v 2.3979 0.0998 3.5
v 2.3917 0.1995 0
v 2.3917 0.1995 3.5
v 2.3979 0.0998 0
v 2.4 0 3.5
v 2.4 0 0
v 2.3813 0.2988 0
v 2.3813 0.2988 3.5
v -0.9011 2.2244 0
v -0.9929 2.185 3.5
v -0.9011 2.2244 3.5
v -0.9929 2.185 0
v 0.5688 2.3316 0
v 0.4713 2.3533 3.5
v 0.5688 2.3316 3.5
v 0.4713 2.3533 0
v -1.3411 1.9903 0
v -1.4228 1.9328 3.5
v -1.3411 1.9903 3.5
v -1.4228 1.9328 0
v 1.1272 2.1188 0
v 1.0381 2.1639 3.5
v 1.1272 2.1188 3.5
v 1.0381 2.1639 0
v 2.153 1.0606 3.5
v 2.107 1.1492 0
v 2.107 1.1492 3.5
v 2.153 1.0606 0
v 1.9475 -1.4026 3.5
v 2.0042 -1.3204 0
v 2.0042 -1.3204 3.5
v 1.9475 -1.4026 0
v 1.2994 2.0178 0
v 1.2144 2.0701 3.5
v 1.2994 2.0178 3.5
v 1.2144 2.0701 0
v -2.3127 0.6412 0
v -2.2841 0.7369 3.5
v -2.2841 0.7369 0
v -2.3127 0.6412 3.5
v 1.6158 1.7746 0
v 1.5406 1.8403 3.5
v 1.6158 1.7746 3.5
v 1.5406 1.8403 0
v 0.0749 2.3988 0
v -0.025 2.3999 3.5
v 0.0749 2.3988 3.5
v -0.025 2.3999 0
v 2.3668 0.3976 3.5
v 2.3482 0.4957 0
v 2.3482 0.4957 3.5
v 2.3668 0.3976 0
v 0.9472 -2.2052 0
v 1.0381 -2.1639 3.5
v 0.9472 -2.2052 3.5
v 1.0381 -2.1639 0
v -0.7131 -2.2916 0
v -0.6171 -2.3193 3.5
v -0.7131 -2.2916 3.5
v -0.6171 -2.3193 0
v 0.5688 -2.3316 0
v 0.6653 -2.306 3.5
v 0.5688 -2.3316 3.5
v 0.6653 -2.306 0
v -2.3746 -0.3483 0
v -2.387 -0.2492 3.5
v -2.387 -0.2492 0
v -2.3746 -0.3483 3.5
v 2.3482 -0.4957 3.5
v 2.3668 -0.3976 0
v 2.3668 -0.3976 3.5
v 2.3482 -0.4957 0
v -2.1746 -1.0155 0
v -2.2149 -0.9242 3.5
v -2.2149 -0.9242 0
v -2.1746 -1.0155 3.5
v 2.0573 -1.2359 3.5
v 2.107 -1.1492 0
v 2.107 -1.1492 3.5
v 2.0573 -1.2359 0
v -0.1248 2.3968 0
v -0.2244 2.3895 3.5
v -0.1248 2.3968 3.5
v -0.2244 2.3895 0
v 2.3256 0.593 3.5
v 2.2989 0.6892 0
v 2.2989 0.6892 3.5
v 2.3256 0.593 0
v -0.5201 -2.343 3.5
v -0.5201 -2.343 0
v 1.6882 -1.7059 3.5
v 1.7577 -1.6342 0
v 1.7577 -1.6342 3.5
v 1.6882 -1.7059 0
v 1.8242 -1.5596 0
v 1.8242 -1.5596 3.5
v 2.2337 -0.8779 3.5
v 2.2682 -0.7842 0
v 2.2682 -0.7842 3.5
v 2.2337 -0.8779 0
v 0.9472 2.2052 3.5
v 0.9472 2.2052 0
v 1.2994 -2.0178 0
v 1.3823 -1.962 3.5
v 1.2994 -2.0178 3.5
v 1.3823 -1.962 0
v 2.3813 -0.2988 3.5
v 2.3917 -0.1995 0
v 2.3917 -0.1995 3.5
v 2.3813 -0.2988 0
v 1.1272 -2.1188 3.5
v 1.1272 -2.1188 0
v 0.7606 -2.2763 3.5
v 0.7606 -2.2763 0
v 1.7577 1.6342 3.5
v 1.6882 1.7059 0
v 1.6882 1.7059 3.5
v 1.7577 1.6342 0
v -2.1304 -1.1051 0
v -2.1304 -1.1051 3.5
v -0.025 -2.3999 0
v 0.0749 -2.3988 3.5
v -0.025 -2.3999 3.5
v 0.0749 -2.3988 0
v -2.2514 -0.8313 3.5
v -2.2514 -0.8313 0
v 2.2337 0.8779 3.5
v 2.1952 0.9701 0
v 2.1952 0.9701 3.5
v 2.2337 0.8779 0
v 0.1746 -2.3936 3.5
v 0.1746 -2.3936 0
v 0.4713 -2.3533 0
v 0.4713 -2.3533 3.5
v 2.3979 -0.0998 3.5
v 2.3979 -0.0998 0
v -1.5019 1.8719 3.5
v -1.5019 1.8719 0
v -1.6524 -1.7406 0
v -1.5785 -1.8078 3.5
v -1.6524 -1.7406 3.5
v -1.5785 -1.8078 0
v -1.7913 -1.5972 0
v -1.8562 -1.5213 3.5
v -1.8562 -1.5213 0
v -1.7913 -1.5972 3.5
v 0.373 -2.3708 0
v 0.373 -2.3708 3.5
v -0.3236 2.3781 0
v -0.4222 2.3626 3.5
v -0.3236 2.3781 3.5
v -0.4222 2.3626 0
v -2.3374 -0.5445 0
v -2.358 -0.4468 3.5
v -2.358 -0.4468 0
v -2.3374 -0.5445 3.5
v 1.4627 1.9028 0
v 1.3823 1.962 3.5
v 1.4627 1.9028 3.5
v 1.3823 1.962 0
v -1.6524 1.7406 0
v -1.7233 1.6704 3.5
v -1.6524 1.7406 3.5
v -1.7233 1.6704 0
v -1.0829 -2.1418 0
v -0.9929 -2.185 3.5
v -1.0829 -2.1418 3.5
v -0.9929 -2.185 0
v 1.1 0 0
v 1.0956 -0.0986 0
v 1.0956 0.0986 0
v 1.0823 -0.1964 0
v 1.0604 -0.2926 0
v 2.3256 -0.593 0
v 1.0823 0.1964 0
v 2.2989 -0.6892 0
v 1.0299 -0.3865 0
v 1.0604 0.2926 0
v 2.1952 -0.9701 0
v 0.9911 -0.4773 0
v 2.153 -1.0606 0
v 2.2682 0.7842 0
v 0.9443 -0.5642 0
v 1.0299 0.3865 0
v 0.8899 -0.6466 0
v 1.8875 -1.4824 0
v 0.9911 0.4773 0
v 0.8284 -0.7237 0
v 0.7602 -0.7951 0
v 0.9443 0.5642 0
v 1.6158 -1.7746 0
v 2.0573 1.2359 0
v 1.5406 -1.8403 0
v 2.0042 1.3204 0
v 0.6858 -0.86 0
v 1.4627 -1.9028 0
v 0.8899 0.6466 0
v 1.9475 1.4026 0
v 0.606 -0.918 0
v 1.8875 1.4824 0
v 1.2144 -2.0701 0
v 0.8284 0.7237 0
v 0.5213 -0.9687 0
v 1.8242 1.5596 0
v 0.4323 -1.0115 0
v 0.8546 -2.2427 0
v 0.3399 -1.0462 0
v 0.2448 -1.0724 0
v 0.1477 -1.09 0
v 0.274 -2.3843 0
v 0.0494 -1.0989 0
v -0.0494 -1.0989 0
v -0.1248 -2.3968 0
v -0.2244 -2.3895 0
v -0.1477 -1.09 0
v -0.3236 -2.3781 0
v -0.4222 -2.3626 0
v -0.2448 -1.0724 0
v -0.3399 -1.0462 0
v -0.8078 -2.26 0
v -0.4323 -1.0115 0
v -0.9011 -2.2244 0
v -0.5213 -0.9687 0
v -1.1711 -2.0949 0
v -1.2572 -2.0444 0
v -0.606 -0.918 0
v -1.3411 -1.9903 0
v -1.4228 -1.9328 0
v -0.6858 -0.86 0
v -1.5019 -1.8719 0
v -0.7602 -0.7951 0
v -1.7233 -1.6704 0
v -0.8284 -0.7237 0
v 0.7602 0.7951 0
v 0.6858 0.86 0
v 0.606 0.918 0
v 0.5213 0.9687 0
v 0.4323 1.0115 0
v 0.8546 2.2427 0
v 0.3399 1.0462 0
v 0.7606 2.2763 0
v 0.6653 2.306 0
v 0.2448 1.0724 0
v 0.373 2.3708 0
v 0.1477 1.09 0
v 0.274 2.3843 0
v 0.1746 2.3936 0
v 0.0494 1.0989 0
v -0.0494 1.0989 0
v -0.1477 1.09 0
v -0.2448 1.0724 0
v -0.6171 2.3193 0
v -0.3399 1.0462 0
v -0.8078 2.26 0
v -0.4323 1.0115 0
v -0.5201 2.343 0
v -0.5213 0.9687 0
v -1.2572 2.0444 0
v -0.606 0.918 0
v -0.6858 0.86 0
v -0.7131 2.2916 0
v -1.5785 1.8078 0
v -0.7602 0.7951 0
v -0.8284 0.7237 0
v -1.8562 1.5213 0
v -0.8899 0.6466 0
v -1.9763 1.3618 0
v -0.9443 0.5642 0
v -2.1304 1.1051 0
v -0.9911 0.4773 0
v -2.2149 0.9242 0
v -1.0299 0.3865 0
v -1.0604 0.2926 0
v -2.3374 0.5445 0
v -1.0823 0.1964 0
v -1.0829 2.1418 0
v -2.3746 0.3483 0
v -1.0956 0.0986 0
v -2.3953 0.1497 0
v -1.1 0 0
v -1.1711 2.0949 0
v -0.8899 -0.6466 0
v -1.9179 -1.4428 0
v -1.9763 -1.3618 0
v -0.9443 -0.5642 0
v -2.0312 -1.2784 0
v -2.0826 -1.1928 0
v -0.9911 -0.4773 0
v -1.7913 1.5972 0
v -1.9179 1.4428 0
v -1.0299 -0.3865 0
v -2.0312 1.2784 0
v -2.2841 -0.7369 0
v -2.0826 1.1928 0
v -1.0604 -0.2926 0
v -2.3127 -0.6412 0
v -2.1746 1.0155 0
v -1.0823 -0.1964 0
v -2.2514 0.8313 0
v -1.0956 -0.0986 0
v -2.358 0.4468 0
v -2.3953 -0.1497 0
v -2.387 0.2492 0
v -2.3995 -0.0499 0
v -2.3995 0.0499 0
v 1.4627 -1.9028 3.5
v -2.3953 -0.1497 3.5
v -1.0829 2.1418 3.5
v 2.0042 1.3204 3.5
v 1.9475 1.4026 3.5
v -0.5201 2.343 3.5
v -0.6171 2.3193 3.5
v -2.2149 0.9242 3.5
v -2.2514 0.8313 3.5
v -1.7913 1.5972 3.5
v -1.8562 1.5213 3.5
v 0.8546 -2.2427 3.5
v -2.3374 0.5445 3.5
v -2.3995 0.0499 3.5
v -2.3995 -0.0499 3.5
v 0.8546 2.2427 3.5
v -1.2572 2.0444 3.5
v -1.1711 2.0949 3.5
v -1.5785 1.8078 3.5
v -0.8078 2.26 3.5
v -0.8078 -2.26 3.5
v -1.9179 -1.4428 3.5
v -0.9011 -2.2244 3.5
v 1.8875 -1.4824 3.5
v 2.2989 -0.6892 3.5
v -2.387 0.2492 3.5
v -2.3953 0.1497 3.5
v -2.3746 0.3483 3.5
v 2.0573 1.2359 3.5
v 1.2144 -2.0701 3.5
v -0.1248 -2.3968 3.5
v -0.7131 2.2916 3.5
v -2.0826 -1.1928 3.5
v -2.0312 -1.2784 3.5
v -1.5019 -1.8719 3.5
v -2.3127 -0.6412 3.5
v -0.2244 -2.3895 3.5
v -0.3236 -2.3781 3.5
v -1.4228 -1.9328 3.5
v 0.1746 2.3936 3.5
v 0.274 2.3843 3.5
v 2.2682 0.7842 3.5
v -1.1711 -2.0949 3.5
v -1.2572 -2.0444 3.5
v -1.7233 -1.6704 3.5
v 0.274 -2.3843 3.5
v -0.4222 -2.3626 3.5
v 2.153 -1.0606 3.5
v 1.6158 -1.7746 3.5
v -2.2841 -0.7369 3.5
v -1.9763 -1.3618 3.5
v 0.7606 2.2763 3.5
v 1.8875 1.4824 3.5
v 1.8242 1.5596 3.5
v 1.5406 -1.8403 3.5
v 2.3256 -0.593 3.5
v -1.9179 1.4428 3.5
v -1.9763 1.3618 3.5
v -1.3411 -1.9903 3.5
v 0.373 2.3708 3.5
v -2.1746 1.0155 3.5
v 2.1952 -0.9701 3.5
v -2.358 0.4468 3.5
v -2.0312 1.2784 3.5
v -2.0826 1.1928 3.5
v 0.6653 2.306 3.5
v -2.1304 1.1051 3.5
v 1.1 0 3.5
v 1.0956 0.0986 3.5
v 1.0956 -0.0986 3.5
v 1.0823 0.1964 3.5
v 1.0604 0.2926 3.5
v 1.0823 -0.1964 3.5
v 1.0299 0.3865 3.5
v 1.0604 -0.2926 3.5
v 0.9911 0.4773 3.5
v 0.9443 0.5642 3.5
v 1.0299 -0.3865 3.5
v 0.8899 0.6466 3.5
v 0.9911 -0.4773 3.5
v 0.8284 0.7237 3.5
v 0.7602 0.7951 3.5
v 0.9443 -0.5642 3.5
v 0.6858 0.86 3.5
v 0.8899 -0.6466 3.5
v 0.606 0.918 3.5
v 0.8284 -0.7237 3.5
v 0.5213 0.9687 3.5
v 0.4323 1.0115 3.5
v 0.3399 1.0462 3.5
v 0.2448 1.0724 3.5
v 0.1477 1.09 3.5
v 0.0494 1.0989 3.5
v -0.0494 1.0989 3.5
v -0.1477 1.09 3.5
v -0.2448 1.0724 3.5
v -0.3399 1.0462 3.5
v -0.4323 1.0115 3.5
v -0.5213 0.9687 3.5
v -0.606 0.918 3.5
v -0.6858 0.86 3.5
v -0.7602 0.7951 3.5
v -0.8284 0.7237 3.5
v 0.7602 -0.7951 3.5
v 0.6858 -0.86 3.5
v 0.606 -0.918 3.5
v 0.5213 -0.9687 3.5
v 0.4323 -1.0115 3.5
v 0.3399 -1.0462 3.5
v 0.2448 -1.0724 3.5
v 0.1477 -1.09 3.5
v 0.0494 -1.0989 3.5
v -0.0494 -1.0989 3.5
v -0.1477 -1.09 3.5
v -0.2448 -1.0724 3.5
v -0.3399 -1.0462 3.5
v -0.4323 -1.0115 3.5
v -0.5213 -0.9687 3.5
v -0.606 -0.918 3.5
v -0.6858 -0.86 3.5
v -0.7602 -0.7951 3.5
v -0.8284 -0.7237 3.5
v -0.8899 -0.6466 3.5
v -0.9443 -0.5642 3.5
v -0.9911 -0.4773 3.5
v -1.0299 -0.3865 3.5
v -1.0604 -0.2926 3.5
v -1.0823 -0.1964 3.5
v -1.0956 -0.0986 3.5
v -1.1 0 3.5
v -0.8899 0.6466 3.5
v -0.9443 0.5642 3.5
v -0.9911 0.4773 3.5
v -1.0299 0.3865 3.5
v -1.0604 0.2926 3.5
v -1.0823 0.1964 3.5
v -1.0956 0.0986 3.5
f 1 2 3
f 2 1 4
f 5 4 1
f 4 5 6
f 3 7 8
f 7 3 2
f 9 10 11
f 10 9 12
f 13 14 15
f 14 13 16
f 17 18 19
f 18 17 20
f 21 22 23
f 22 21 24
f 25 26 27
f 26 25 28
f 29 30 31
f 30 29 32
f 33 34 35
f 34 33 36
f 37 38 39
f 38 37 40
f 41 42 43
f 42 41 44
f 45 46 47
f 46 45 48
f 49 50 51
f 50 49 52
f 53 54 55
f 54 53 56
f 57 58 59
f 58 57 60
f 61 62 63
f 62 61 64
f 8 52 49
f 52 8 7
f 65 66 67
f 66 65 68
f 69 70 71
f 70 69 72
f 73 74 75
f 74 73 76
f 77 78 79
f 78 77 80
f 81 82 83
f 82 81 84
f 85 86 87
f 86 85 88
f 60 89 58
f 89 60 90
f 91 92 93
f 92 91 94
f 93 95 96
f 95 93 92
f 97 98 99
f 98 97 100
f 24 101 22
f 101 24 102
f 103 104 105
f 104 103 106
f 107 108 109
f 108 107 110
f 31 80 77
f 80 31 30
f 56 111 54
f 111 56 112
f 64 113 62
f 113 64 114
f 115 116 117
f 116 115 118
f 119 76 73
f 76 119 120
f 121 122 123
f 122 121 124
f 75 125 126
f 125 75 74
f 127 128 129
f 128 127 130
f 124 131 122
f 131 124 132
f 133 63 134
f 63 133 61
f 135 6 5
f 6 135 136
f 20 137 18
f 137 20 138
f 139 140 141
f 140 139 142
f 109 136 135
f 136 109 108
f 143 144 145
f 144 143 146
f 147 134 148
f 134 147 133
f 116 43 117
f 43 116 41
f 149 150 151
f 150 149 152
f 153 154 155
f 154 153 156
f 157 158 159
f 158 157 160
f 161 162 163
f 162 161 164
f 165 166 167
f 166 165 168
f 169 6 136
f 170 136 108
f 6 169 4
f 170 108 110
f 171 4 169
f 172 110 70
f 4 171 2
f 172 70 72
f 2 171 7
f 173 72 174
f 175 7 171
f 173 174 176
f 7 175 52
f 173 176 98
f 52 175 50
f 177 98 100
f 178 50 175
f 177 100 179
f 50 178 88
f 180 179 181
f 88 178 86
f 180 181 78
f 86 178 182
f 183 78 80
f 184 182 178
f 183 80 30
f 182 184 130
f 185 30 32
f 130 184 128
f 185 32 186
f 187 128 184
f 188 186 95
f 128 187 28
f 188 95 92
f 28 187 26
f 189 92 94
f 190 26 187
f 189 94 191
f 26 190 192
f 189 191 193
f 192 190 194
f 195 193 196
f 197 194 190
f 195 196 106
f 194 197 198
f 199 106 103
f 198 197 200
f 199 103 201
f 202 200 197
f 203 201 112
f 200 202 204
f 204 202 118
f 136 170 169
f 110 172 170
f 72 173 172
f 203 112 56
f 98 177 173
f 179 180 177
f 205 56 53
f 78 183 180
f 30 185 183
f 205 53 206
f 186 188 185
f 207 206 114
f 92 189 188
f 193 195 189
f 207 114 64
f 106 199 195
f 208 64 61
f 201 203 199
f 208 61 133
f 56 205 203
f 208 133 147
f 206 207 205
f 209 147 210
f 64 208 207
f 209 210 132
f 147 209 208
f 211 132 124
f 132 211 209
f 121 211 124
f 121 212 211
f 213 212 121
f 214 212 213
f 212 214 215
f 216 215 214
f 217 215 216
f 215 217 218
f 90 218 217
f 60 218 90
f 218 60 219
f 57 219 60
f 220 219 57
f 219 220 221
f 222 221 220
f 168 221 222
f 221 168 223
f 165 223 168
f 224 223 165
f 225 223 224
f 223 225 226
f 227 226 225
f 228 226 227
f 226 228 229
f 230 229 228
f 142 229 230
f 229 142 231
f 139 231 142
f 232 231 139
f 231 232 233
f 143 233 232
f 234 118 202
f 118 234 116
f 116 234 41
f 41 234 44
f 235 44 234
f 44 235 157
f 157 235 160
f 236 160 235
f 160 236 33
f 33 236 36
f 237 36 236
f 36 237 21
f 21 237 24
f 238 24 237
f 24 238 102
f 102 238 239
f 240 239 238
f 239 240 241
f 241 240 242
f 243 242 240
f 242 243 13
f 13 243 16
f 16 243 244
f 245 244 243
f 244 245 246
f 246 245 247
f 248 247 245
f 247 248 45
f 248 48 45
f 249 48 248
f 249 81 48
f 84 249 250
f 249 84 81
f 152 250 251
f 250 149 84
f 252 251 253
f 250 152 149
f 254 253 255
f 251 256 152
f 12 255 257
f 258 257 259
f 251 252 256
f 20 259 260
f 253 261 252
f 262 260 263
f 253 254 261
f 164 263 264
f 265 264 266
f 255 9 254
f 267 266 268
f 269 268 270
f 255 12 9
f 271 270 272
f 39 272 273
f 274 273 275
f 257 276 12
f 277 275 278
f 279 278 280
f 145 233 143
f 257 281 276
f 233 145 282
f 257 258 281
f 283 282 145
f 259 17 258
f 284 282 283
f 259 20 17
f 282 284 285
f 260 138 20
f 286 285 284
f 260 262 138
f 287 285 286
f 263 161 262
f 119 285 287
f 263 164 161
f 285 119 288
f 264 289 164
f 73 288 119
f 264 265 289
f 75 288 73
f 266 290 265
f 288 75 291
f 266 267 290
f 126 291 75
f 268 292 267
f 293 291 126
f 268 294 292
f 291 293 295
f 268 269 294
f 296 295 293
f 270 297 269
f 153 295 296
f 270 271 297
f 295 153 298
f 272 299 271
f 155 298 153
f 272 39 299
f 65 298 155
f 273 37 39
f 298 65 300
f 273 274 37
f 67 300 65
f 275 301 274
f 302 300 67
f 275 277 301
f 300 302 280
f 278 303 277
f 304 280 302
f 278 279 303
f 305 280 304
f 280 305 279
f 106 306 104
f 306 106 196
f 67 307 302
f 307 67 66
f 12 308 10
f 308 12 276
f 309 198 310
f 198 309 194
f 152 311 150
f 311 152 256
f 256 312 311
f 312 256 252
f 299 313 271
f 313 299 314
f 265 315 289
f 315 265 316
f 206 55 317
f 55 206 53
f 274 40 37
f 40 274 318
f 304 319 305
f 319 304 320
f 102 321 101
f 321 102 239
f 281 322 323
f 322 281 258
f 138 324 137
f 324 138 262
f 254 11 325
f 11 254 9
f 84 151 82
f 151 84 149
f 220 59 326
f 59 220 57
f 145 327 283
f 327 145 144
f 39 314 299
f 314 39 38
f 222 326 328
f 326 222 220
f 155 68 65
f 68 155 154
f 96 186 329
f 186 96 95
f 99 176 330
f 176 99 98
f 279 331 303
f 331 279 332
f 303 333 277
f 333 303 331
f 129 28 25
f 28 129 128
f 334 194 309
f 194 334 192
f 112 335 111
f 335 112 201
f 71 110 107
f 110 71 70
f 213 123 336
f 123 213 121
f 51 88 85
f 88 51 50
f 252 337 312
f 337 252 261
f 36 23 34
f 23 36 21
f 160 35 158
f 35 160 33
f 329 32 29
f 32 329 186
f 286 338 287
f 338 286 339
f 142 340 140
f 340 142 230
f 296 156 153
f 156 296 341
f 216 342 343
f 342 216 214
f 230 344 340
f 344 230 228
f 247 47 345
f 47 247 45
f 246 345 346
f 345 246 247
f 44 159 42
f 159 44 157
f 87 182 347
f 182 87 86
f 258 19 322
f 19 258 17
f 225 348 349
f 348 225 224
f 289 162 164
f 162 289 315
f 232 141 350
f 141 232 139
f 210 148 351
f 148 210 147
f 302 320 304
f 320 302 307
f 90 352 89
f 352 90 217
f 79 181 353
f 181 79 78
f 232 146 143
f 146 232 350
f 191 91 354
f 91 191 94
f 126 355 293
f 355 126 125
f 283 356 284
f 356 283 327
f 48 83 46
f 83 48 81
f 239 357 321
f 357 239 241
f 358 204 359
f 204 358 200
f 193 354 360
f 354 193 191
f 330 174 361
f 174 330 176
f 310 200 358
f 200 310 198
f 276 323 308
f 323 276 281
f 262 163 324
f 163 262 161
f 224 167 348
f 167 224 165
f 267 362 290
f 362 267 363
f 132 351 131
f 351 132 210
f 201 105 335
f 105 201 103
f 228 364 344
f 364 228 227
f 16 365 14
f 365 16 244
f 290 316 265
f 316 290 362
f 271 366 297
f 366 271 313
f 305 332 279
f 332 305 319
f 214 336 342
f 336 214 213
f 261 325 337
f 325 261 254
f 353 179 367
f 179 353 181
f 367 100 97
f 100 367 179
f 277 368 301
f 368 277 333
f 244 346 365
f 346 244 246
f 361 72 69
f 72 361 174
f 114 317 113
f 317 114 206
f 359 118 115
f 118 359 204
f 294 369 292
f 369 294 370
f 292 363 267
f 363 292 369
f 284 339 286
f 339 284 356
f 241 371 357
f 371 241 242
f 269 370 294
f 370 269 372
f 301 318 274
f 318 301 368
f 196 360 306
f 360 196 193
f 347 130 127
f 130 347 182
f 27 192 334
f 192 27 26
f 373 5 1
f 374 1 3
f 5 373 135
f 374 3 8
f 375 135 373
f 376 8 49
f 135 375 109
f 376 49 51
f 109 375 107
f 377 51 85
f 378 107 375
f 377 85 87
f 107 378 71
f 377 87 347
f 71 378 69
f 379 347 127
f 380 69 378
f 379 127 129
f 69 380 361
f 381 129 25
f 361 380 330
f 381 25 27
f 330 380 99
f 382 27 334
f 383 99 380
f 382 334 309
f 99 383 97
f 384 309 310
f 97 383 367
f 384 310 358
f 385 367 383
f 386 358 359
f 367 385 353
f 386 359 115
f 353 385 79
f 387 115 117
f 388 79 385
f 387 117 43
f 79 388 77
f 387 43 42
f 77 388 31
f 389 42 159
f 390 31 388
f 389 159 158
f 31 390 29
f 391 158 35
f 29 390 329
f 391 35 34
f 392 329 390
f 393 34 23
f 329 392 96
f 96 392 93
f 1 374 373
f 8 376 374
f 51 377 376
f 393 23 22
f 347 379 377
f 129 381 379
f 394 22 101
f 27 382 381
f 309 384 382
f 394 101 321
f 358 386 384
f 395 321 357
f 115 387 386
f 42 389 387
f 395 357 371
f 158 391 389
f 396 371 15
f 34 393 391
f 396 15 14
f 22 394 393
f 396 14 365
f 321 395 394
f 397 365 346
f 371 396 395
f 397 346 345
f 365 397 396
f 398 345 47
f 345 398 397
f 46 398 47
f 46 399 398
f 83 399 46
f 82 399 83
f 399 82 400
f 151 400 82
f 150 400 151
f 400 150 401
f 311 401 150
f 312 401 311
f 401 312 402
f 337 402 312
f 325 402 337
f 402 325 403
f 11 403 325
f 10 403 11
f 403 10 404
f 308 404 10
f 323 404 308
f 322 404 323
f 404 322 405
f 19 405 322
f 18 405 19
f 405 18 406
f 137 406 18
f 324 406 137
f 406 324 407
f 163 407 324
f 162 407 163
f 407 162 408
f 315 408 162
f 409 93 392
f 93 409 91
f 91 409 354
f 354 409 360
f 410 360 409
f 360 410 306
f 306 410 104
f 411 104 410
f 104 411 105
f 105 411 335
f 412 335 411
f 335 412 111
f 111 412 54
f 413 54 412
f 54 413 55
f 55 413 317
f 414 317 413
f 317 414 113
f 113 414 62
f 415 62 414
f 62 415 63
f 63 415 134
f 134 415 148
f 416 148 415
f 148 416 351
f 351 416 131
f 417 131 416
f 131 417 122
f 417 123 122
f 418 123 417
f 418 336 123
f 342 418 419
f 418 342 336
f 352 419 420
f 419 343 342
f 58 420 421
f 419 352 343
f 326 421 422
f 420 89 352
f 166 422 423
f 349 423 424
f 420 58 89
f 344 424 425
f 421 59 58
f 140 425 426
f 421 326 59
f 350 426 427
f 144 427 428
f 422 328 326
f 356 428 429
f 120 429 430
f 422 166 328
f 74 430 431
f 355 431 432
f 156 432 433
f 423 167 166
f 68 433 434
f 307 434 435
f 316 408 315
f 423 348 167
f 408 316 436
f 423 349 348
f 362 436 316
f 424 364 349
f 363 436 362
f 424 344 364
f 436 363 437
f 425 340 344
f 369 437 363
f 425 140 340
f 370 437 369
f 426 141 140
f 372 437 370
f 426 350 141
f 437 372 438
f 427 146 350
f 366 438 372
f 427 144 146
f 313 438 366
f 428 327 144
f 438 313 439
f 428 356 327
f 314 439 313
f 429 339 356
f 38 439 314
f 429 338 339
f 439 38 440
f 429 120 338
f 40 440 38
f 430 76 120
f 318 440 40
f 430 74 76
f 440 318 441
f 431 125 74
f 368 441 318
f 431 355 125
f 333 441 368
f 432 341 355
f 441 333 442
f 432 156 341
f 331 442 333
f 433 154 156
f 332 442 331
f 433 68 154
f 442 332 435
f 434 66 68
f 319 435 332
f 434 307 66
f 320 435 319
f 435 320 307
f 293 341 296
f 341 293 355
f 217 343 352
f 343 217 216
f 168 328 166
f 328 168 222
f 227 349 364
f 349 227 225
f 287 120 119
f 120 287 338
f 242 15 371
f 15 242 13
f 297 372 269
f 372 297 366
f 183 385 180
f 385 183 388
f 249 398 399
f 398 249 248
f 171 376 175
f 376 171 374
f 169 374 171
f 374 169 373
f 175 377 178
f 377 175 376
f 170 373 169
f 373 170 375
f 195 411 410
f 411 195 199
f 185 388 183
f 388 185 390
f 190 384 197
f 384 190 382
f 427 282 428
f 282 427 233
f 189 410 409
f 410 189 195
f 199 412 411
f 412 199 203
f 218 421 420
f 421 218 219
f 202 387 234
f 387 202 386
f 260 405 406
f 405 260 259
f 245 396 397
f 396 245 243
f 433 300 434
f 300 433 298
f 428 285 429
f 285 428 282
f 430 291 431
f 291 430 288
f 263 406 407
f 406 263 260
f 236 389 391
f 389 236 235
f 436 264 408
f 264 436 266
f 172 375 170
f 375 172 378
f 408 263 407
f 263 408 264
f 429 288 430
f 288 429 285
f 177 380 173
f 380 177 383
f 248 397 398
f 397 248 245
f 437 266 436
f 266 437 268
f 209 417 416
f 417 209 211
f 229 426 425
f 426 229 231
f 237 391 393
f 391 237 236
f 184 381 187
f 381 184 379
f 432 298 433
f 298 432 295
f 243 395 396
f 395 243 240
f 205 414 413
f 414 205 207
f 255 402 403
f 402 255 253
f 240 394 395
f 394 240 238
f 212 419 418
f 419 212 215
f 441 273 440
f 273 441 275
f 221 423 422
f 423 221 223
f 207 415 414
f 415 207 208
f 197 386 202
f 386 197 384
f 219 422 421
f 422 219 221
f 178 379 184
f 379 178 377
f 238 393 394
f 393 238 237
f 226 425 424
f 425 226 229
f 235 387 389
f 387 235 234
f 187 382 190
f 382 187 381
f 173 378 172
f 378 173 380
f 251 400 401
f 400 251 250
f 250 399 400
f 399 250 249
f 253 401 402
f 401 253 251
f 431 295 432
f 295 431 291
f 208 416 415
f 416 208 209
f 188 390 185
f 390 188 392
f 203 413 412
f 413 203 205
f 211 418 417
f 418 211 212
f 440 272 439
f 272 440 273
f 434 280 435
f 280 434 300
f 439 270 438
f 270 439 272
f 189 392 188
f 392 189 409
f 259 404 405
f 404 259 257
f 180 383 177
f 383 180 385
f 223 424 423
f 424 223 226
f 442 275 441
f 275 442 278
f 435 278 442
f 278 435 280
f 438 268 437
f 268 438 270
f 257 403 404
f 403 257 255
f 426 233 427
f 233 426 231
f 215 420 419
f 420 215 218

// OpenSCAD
$fs = $preview ? 1 : 0.1;
$fa = $preview ? 3 : 0.1;

module screw(d, l) {
    union() {
        cylinder(l, d/2, d/2);
        
        translate([0, 0, l])
        difference() {
            cylinder(2, 2, 2);
            
            translate([0, 0, 2])
            cube([6, 1, 1.1], center = true);
        }
    }
}

module standoff(di, do, l) {
    difference() {
        cylinder(l, do/2, do/2);
        
        translate([0, 0, -0.5])
        cylinder(l+1, di/2, di/2);
    }
}

//screw(2, 8);
standoff(2.2, 4.8, 3.5);
